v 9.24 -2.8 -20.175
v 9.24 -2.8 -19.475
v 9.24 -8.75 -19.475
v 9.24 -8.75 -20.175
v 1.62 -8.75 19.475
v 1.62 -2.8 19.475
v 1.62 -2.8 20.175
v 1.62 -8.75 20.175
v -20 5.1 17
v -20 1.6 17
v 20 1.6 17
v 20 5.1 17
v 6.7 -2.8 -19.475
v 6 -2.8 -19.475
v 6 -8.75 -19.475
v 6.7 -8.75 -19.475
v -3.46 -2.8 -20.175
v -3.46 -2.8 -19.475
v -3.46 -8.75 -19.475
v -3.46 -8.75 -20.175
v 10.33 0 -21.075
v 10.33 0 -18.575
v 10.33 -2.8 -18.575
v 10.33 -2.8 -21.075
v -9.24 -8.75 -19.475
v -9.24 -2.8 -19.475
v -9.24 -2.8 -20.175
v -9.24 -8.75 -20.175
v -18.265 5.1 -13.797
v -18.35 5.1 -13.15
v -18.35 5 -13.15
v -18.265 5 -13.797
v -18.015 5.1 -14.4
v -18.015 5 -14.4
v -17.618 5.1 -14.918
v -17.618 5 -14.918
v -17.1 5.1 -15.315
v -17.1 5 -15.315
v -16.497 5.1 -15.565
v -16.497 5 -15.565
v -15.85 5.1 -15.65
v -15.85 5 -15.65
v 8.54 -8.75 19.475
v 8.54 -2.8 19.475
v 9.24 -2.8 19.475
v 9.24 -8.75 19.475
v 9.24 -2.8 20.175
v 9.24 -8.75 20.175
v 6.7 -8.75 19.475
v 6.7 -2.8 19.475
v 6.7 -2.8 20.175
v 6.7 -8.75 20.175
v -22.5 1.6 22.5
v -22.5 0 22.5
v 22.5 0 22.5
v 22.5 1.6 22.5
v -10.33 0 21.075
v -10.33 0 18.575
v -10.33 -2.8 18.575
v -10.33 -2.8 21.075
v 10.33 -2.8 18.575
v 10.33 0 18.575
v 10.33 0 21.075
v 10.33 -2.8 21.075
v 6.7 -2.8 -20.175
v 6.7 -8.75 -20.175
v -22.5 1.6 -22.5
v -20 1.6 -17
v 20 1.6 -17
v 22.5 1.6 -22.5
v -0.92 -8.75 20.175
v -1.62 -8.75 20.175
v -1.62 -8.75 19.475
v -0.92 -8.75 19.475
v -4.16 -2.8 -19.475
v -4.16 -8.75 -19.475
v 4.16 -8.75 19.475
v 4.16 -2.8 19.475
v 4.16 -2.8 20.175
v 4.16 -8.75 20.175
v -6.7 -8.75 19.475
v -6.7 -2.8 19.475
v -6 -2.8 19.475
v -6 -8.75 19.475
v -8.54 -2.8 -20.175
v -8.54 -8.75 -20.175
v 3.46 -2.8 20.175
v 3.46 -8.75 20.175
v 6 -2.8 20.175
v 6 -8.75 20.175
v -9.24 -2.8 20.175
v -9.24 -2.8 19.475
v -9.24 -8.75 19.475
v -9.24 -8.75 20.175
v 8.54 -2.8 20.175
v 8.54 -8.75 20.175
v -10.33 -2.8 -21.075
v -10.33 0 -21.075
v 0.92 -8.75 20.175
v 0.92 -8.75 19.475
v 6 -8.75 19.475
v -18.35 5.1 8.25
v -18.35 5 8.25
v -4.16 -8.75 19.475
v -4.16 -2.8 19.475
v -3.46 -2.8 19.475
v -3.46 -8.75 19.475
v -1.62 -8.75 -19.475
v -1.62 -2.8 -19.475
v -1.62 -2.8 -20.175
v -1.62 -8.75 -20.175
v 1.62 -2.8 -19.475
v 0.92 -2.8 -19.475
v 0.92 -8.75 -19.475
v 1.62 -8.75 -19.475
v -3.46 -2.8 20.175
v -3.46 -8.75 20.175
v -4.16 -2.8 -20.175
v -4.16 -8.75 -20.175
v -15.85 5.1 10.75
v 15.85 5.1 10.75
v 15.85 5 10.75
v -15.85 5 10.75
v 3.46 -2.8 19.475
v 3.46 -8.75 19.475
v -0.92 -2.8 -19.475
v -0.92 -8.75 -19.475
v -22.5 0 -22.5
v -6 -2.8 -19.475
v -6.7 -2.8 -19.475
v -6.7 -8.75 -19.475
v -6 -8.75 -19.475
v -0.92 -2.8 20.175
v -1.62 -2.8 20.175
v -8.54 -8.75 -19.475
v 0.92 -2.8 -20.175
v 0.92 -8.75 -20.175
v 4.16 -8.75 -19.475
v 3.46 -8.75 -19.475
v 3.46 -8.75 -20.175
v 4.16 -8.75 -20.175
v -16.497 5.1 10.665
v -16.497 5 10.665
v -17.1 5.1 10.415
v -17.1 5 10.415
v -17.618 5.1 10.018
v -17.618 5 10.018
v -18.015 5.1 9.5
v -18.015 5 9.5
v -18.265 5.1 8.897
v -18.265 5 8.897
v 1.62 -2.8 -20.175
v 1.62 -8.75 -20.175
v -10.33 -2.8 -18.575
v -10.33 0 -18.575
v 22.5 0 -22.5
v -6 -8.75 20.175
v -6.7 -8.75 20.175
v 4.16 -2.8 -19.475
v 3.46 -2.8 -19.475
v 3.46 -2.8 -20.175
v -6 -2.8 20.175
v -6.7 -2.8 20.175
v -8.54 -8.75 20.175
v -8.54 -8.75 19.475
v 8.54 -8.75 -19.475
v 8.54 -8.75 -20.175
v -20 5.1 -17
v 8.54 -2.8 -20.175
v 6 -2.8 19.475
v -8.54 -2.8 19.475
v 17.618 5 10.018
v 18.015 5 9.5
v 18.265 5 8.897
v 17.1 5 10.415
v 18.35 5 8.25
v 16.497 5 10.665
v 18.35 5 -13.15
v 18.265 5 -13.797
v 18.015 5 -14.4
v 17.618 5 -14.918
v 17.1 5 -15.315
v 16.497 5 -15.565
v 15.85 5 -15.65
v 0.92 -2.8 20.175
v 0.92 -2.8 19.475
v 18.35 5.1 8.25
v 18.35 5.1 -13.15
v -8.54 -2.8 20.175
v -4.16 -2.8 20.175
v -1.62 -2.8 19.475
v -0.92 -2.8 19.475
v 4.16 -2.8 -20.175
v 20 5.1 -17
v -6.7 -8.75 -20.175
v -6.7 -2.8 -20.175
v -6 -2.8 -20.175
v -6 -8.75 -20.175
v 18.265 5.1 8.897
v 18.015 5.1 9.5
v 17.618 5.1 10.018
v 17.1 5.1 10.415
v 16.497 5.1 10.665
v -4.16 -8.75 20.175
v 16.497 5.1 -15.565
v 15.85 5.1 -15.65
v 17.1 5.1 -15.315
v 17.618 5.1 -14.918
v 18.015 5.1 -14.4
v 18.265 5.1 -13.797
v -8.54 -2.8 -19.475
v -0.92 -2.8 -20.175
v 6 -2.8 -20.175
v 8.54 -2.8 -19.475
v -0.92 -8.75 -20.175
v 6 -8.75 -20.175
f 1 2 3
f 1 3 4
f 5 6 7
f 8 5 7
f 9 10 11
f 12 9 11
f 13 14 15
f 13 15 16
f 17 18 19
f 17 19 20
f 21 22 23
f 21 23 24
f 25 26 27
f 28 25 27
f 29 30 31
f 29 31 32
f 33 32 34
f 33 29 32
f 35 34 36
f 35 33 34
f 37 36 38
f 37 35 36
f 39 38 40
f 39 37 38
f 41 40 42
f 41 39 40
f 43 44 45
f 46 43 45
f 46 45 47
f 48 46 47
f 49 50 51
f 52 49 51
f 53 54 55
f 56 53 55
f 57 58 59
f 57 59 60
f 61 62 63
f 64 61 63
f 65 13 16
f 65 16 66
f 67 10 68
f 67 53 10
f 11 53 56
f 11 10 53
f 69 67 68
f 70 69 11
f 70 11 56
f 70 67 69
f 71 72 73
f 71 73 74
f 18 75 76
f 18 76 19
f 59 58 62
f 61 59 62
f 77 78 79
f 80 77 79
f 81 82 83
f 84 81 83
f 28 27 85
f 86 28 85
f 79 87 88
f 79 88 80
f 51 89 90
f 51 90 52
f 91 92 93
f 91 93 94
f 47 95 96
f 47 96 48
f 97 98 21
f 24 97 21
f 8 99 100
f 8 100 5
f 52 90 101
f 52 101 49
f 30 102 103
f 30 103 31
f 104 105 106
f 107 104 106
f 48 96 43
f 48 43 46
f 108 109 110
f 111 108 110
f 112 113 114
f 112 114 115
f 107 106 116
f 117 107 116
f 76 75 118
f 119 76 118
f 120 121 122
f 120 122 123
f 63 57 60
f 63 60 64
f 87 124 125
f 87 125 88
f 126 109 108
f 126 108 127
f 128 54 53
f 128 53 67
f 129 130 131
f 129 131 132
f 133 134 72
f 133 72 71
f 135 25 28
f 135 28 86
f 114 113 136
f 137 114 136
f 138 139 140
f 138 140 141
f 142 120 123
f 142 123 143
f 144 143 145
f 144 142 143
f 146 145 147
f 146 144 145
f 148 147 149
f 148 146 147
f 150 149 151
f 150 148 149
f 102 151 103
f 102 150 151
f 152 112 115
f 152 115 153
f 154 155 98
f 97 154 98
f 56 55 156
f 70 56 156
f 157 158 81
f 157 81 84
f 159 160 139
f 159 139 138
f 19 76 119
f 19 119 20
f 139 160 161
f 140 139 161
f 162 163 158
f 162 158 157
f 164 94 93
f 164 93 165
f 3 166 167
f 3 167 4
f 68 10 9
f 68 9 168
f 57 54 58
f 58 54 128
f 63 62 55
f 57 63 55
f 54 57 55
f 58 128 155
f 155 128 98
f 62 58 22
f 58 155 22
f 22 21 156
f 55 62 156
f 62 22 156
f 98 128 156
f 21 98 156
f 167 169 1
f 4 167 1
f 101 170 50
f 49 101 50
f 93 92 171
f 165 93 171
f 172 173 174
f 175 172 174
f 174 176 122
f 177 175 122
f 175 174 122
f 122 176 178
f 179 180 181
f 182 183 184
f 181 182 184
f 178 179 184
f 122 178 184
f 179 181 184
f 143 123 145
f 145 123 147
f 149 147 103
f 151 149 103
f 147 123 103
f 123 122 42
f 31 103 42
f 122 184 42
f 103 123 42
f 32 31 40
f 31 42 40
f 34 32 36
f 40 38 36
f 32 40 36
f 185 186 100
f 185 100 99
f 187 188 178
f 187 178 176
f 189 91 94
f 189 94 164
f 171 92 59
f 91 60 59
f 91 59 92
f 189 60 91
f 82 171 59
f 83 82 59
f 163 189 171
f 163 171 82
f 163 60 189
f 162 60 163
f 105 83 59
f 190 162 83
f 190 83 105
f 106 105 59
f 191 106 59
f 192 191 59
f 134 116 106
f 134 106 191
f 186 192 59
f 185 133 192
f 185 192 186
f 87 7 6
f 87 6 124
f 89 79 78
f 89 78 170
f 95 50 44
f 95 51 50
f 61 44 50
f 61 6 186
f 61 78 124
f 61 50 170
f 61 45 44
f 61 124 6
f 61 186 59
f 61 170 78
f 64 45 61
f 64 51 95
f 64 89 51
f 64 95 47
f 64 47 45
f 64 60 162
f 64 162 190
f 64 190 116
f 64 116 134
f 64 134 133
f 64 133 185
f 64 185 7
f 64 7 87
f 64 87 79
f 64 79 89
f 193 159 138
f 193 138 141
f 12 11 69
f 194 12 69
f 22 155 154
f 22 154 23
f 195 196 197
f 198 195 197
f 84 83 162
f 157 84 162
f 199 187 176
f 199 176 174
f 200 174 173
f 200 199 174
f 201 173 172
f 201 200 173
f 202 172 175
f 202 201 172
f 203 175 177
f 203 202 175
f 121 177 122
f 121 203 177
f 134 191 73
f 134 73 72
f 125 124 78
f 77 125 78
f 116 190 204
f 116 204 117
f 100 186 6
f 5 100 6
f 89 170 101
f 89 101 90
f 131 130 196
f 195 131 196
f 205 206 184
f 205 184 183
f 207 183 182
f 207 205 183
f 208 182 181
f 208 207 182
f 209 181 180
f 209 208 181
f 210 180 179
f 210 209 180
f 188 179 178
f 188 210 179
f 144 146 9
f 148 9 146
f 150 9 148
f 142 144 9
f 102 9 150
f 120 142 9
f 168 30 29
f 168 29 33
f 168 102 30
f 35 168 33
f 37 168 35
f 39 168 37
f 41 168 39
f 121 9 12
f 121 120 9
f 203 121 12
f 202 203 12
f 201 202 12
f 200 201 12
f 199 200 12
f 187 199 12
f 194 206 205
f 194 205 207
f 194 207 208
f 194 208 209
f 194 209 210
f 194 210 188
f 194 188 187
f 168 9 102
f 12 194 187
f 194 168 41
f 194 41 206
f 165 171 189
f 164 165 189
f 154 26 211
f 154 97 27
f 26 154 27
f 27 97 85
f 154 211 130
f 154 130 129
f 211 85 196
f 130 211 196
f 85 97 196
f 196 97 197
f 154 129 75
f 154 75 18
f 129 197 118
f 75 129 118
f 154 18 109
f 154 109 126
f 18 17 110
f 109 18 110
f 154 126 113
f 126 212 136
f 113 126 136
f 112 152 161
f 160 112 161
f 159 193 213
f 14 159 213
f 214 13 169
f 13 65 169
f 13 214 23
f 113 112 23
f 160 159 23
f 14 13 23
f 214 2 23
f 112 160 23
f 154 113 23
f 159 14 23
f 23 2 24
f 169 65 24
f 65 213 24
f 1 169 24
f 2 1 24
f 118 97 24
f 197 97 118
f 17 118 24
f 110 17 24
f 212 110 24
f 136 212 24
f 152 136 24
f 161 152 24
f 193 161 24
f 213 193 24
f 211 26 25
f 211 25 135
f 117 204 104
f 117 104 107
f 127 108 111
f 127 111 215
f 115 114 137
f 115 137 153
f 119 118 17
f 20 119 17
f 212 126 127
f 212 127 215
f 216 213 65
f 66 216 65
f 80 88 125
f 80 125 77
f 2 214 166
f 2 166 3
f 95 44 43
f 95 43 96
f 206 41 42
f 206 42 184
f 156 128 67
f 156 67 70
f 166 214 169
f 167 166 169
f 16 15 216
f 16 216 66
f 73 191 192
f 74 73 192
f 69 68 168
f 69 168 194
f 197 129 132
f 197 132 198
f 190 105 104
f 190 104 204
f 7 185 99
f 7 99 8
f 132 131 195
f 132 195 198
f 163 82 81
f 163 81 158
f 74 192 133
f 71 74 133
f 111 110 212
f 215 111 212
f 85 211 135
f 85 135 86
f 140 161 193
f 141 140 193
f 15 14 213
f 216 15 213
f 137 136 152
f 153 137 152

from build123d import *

# Parameters (mm, degrees)
SKETCH1_W           = 45
SKETCH1_H           = 45
BOSS_EXTRUDE1_DEPTH = 1.6
SKETCH2_W           = 40
SKETCH2_H           = 34
BOSS_EXTRUDE2_DEPTH = 3.5
SKETCH4_W           = 20.66
SKETCH4_H           = 2.5
BOSS_EXTRUDE3_DEPTH = 2.8
SKETCH5_W           = 0.7
SKETCH5_H           = 0.7
BOSS_EXTRUDE4_DEPTH = 5.95
CUT_EXTRUDE1_DEPTH  = 0.1


with BuildPart() as part:
    # Sketch1 → Boss-Extrude1 (new body)
    with BuildSketch(Plane(origin=(0, 0, 0), x_dir=(1, 0, 0), z_dir=(0, 1, 0))):
        Rectangle(SKETCH1_W, SKETCH1_H)
    extrude(amount=BOSS_EXTRUDE1_DEPTH)

    # Sketch2 → Boss-Extrude2 (add)
    with BuildSketch(Plane(origin=(0, 1.6, 0), x_dir=(1, 0, 0), z_dir=(0, 1, 0))):
        Rectangle(SKETCH2_W, SKETCH2_H)
    extrude(amount=BOSS_EXTRUDE2_DEPTH)

    # Sketch4 → Boss-Extrude3 (add)
    with BuildSketch(Plane.XZ):
        with Locations((0, 19.825)):
            Rectangle(SKETCH4_W, SKETCH4_H)
    boss_extrude3 = extrude(amount=BOSS_EXTRUDE3_DEPTH)

    # Sketch5 → Boss-Extrude4 (add)
    with BuildSketch(Plane.XZ.offset(2.8)):
        with Locations((-8.89, 19.825)):
            Rectangle(SKETCH5_W, SKETCH5_H)
        with Locations((-6.35, 19.825)):
            Rectangle(SKETCH5_W, SKETCH5_H)
        with Locations((-3.81, 19.825)):
            Rectangle(SKETCH5_W, SKETCH5_H)
        with Locations((-1.27, 19.825)):
            Rectangle(SKETCH5_W, SKETCH5_H)
        with Locations((1.27, 19.825)):
            Rectangle(SKETCH5_W, SKETCH5_H)
        with Locations((3.81, 19.825)):
            Rectangle(SKETCH5_W, SKETCH5_H)
        with Locations((6.35, 19.825)):
            Rectangle(SKETCH5_W, SKETCH5_H)
        with Locations((8.89, 19.825)):
            Rectangle(SKETCH5_W, SKETCH5_H)
    boss_extrude4 = extrude(amount=BOSS_EXTRUDE4_DEPTH)

    # Sketch6 → Cut-Extrude1 (cut)
    with BuildSketch(Plane(origin=(0, 5.1, 0), x_dir=(1, 0, 0), z_dir=(0, 1, 0))):
        with BuildLine():
            Line((-15.85, 15.65), (15.85, 15.65))
            ThreePointArc((15.85, 15.65), (17.617766953, 14.917766953), (18.35, 13.15))
            Line((18.35, 13.15), (18.35, -8.25))
            ThreePointArc((18.35, -8.25), (17.617766953, -10.017766953), (15.85, -10.75))
            Line((15.85, -10.75), (-15.85, -10.75))
            ThreePointArc((-15.85, -10.75), (-17.617766953, -10.017766953), (-18.35, -8.25))
            Line((-18.35, -8.25), (-18.35, 13.15))
            ThreePointArc((-18.35, 13.15), (-17.617766953, 14.917766953), (-15.85, 15.65))
        make_face()
    extrude(amount=-CUT_EXTRUDE1_DEPTH, mode=Mode.SUBTRACT)

    # Mirror1: Boss-Extrude3, Boss-Extrude4 across plane
    add(boss_extrude3.mirror(Plane.XY))
    add(boss_extrude4.mirror(Plane.XY))


solid = part.part
